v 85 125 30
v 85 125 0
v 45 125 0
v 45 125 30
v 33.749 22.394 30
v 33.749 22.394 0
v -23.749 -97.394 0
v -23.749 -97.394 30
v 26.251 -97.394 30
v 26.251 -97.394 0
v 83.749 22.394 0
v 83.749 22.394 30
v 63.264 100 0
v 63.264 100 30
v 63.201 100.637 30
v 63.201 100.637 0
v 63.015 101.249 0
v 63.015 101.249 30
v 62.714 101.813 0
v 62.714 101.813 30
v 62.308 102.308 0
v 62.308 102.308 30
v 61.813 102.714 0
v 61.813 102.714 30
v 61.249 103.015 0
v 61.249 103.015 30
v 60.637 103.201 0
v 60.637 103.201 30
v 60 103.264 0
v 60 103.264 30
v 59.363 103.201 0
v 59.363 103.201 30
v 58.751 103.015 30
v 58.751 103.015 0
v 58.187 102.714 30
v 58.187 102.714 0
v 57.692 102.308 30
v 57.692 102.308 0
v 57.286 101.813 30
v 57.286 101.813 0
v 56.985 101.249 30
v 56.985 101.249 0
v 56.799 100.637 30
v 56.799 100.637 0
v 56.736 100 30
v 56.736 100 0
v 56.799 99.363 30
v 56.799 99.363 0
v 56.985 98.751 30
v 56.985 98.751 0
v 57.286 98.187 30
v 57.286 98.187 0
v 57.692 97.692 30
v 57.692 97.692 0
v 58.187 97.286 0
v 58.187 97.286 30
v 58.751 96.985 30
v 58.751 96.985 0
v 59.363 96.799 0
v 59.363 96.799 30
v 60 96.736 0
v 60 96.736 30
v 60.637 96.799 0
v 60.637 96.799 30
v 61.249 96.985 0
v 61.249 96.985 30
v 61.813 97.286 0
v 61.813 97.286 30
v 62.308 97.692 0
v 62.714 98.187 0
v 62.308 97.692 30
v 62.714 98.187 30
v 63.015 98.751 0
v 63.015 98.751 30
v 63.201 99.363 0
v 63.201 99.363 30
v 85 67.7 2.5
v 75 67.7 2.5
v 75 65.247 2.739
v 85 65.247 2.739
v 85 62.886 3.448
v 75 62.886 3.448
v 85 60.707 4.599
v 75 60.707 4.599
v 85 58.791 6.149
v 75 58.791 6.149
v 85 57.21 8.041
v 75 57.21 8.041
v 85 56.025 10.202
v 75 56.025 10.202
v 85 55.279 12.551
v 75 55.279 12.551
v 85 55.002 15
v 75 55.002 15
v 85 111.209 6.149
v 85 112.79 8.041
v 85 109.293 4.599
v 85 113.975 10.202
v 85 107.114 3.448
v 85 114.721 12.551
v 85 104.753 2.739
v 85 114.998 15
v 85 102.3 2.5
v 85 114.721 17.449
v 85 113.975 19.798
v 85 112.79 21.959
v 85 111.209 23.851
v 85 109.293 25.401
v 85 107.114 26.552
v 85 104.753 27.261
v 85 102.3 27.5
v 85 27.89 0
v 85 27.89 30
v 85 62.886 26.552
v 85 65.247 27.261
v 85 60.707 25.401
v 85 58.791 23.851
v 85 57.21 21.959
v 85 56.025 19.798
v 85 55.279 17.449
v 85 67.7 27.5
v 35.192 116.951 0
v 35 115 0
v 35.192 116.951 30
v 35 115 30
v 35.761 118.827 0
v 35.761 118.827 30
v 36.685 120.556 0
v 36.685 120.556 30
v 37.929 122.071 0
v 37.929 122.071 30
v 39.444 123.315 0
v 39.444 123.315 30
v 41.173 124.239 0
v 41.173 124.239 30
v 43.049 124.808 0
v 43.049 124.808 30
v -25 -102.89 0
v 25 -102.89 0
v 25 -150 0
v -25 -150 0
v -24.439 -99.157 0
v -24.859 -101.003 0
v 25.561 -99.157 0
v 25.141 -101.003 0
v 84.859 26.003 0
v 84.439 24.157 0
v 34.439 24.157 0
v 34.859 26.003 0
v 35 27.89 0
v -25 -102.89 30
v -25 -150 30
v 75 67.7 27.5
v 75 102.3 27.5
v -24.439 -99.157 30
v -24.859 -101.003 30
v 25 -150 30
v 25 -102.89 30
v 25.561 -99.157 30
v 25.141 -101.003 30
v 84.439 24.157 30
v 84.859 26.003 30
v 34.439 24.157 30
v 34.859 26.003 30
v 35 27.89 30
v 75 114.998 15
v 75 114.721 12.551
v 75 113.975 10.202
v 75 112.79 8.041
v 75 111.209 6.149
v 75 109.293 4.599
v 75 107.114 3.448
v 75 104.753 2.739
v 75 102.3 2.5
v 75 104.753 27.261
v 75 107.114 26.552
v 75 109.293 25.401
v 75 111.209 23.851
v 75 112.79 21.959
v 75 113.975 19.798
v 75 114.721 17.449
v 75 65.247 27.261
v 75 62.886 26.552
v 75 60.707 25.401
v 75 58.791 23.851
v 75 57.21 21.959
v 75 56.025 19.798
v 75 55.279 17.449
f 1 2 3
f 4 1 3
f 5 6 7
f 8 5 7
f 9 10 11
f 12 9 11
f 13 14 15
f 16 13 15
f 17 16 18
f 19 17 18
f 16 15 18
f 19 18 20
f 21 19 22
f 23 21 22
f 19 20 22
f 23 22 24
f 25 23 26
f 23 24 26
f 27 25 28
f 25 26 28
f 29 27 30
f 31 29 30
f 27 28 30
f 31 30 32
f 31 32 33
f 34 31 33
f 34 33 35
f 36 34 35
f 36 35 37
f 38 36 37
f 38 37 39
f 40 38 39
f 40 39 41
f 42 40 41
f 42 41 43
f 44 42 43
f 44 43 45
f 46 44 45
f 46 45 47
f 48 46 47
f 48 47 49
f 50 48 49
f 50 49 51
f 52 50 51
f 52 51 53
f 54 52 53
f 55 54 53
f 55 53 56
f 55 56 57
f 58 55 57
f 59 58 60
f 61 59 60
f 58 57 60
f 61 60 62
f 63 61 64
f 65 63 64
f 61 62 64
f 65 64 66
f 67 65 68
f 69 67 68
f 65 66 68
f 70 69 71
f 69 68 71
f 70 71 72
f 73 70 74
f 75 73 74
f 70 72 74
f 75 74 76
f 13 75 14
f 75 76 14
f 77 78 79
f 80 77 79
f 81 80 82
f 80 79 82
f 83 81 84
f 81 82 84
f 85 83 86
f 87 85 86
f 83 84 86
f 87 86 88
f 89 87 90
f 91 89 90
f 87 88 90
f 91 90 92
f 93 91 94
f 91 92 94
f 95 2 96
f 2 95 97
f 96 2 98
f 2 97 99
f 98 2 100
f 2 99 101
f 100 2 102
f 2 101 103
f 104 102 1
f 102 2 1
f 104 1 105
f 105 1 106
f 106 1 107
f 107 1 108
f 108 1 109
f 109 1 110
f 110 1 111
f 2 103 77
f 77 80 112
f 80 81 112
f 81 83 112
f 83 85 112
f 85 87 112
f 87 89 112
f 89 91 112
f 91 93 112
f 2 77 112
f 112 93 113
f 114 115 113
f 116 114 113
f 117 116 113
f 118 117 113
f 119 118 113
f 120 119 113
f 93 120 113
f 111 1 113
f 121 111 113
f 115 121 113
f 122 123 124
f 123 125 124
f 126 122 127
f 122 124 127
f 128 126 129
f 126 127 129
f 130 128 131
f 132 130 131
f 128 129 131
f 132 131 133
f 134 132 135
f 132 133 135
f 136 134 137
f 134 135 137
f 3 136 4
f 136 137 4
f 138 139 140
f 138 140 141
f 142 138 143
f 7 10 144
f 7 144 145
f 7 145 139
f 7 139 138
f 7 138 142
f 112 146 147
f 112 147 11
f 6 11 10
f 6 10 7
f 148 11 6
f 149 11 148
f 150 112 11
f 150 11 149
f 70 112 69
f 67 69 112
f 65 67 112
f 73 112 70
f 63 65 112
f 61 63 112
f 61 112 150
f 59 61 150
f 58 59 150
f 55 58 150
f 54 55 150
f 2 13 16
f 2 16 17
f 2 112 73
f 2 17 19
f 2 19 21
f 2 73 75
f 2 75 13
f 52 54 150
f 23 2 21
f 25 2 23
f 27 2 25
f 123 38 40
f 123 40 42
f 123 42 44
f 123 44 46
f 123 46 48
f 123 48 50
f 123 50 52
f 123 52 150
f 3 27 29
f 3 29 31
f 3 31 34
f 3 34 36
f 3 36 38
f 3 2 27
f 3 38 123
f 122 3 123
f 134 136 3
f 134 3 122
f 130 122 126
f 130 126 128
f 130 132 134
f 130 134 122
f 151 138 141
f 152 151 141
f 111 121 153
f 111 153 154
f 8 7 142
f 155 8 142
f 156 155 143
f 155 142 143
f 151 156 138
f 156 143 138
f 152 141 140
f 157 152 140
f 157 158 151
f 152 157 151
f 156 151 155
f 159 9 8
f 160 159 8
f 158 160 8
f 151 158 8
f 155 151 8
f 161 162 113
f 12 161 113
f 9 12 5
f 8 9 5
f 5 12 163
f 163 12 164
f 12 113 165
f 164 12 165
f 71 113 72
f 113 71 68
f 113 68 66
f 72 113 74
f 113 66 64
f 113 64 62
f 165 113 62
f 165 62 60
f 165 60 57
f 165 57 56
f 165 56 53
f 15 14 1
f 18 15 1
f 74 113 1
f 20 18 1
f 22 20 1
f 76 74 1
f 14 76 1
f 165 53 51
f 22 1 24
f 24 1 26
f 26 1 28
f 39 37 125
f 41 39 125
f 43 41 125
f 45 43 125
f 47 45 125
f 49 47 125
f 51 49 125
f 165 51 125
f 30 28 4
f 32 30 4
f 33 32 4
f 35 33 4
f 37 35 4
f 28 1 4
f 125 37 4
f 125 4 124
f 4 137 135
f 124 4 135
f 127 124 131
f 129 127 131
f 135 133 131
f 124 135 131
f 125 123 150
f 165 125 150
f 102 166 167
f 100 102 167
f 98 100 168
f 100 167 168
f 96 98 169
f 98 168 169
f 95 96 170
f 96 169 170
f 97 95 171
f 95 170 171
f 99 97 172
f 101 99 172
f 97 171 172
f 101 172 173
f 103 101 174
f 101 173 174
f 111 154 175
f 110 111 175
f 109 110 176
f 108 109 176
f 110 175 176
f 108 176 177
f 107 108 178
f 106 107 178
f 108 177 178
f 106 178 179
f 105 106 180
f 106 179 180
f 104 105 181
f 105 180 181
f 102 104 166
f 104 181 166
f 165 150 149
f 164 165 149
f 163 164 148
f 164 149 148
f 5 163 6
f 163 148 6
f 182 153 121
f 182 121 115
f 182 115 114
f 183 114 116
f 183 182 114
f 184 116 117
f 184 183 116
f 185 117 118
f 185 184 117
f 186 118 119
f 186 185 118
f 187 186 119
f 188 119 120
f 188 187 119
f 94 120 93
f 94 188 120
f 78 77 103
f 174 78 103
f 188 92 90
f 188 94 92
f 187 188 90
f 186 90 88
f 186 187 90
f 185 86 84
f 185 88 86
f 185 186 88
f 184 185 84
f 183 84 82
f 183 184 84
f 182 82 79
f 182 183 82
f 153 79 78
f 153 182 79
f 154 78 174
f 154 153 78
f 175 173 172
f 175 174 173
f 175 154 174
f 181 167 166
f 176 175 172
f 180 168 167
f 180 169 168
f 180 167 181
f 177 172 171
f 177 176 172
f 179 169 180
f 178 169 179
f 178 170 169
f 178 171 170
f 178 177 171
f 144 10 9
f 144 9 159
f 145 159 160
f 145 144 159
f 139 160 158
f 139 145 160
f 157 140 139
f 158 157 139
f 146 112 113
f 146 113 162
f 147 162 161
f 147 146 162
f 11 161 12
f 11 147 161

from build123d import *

# Parameters (mm, degrees)
F1_DEPTH    = 30
F2_W        = 60
F2_H        = 25
F3_DEPTH    = 10
F4_R        = 10
F5_R        = 3.2639
F6_DEPTH    = 30.001
F7_T1_DEPTH = 30
F7_T3_DEPTH = 10
F7_T5_DEPTH = 41.75
F7_T7_DEPTH = 44.4507439359


# Not quite as in the source:
# - a fillet or chamfer that OpenCascade refuses, or shapes differently, is made with other operations: its cross-section is extruded or revolved along the edge and cut away or added


with BuildPart() as f1:
    # F0 (on Top) → F1 (new body)
    with BuildSketch(Plane.XY):
        Polygon((-25, -100), (-25, -150), (25, -150), (25, -100), (85, 25), (85, 125), (35, 125), (35, 25), align=None)
    extrude(amount=F1_DEPTH)

    # F2 (on face) → F3 (cut)
    with BuildSketch(Plane.YZ.offset(85)):
        with Locations((85, 15)):
            Rectangle(F2_W, F2_H)
    extrude(amount=-F3_DEPTH, mode=Mode.SUBTRACT)

    # F4
    f4_edges = [f1.edges().sort_by_distance(p)[0] for p in [
        (35, 125, 15),
    ]]
    fillet(f4_edges, radius=F4_R)

    # F5 (on face) → F6 (cut, through all)
    with BuildSketch(Plane.XY.offset(30)):
        with Locations((60, 100)):
            Circle(F5_R)
    extrude(amount=-F6_DEPTH, mode=Mode.SUBTRACT)

    # F7: fillet of radius 12.7 on 8 edges, made by hand

    # F7_s2 → F7_t1 (join)
    with BuildSketch(Plane.XY):
        with BuildLine():
            ThreePointArc((26.2506571702, -97.3944642288), (25.3166108448, -100.0720513739), (25, -102.8901487872))
            Line((25, -102.8901487872), (25, -100))
            Line((25, -100), (26.2506571702, -97.3944642288))
        make_face()
        with BuildLine():
            ThreePointArc((35, 27.8901487872), (34.6833891552, 25.0720513739), (33.7493428298, 22.3944642288))
            Line((33.7493428298, 22.3944642288), (35, 25))
            Line((35, 25), (35, 27.8901487872))
        make_face()
    extrude(amount=F7_T1_DEPTH)

    # F7_s4 → F7_t3 (join)
    with BuildSketch(Plane.YZ.offset(75)):
        with BuildLine():
            ThreePointArc((102.3, 27.5), (111.2802561211, 23.7802561211), (115, 14.8))
            Line((115, 14.8), (115, 27.5))
            Line((115, 27.5), (102.3, 27.5))
        make_face()
        with BuildLine():
            ThreePointArc((115, 15.2), (111.2802561211, 6.2197438789), (102.3, 2.5))
            Line((102.3, 2.5), (115, 2.5))
            Line((115, 2.5), (115, 15.2))
        make_face()
    extrude(amount=F7_T3_DEPTH)

    # F7_s6 → F7_t5 (join)
    with BuildSketch(Plane.YZ.offset(43.25)):
        with BuildLine():
            ThreePointArc((67.7, 27.5), (58.7197438789, 23.7802561211), (55, 14.8))
            Line((55, 14.8), (55, 27.5))
            Line((55, 27.5), (67.7, 27.5))
        make_face()
        with BuildLine():
            ThreePointArc((67.7, 2.5), (58.7197438789, 6.2197438789), (55, 15.2))
            Line((55, 15.2), (55, 2.5))
            Line((55, 2.5), (67.7, 2.5))
        make_face()
    extrude(amount=F7_T5_DEPTH)

    # F7_s8 → F7_t7 (cut)
    with BuildSketch(Plane.XY.offset(-7.2253719679)):
        with BuildLine():
            ThreePointArc((85, 27.8901487872), (84.6833891552, 25.0720513739), (83.7493428298, 22.3944642288))
            Line((83.7493428298, 22.3944642288), (85, 25))
            Line((85, 25), (85, 27.8901487872))
        make_face()
        with BuildLine():
            ThreePointArc((-23.7493428298, -97.3944642288), (-24.6833891552, -100.0720513739), (-25, -102.8901487872))
            Line((-25, -102.8901487872), (-25, -100))
            Line((-25, -100), (-23.7493428298, -97.3944642288))
        make_face()
    extrude(amount=F7_T7_DEPTH, mode=Mode.SUBTRACT)


solid = f1.part
